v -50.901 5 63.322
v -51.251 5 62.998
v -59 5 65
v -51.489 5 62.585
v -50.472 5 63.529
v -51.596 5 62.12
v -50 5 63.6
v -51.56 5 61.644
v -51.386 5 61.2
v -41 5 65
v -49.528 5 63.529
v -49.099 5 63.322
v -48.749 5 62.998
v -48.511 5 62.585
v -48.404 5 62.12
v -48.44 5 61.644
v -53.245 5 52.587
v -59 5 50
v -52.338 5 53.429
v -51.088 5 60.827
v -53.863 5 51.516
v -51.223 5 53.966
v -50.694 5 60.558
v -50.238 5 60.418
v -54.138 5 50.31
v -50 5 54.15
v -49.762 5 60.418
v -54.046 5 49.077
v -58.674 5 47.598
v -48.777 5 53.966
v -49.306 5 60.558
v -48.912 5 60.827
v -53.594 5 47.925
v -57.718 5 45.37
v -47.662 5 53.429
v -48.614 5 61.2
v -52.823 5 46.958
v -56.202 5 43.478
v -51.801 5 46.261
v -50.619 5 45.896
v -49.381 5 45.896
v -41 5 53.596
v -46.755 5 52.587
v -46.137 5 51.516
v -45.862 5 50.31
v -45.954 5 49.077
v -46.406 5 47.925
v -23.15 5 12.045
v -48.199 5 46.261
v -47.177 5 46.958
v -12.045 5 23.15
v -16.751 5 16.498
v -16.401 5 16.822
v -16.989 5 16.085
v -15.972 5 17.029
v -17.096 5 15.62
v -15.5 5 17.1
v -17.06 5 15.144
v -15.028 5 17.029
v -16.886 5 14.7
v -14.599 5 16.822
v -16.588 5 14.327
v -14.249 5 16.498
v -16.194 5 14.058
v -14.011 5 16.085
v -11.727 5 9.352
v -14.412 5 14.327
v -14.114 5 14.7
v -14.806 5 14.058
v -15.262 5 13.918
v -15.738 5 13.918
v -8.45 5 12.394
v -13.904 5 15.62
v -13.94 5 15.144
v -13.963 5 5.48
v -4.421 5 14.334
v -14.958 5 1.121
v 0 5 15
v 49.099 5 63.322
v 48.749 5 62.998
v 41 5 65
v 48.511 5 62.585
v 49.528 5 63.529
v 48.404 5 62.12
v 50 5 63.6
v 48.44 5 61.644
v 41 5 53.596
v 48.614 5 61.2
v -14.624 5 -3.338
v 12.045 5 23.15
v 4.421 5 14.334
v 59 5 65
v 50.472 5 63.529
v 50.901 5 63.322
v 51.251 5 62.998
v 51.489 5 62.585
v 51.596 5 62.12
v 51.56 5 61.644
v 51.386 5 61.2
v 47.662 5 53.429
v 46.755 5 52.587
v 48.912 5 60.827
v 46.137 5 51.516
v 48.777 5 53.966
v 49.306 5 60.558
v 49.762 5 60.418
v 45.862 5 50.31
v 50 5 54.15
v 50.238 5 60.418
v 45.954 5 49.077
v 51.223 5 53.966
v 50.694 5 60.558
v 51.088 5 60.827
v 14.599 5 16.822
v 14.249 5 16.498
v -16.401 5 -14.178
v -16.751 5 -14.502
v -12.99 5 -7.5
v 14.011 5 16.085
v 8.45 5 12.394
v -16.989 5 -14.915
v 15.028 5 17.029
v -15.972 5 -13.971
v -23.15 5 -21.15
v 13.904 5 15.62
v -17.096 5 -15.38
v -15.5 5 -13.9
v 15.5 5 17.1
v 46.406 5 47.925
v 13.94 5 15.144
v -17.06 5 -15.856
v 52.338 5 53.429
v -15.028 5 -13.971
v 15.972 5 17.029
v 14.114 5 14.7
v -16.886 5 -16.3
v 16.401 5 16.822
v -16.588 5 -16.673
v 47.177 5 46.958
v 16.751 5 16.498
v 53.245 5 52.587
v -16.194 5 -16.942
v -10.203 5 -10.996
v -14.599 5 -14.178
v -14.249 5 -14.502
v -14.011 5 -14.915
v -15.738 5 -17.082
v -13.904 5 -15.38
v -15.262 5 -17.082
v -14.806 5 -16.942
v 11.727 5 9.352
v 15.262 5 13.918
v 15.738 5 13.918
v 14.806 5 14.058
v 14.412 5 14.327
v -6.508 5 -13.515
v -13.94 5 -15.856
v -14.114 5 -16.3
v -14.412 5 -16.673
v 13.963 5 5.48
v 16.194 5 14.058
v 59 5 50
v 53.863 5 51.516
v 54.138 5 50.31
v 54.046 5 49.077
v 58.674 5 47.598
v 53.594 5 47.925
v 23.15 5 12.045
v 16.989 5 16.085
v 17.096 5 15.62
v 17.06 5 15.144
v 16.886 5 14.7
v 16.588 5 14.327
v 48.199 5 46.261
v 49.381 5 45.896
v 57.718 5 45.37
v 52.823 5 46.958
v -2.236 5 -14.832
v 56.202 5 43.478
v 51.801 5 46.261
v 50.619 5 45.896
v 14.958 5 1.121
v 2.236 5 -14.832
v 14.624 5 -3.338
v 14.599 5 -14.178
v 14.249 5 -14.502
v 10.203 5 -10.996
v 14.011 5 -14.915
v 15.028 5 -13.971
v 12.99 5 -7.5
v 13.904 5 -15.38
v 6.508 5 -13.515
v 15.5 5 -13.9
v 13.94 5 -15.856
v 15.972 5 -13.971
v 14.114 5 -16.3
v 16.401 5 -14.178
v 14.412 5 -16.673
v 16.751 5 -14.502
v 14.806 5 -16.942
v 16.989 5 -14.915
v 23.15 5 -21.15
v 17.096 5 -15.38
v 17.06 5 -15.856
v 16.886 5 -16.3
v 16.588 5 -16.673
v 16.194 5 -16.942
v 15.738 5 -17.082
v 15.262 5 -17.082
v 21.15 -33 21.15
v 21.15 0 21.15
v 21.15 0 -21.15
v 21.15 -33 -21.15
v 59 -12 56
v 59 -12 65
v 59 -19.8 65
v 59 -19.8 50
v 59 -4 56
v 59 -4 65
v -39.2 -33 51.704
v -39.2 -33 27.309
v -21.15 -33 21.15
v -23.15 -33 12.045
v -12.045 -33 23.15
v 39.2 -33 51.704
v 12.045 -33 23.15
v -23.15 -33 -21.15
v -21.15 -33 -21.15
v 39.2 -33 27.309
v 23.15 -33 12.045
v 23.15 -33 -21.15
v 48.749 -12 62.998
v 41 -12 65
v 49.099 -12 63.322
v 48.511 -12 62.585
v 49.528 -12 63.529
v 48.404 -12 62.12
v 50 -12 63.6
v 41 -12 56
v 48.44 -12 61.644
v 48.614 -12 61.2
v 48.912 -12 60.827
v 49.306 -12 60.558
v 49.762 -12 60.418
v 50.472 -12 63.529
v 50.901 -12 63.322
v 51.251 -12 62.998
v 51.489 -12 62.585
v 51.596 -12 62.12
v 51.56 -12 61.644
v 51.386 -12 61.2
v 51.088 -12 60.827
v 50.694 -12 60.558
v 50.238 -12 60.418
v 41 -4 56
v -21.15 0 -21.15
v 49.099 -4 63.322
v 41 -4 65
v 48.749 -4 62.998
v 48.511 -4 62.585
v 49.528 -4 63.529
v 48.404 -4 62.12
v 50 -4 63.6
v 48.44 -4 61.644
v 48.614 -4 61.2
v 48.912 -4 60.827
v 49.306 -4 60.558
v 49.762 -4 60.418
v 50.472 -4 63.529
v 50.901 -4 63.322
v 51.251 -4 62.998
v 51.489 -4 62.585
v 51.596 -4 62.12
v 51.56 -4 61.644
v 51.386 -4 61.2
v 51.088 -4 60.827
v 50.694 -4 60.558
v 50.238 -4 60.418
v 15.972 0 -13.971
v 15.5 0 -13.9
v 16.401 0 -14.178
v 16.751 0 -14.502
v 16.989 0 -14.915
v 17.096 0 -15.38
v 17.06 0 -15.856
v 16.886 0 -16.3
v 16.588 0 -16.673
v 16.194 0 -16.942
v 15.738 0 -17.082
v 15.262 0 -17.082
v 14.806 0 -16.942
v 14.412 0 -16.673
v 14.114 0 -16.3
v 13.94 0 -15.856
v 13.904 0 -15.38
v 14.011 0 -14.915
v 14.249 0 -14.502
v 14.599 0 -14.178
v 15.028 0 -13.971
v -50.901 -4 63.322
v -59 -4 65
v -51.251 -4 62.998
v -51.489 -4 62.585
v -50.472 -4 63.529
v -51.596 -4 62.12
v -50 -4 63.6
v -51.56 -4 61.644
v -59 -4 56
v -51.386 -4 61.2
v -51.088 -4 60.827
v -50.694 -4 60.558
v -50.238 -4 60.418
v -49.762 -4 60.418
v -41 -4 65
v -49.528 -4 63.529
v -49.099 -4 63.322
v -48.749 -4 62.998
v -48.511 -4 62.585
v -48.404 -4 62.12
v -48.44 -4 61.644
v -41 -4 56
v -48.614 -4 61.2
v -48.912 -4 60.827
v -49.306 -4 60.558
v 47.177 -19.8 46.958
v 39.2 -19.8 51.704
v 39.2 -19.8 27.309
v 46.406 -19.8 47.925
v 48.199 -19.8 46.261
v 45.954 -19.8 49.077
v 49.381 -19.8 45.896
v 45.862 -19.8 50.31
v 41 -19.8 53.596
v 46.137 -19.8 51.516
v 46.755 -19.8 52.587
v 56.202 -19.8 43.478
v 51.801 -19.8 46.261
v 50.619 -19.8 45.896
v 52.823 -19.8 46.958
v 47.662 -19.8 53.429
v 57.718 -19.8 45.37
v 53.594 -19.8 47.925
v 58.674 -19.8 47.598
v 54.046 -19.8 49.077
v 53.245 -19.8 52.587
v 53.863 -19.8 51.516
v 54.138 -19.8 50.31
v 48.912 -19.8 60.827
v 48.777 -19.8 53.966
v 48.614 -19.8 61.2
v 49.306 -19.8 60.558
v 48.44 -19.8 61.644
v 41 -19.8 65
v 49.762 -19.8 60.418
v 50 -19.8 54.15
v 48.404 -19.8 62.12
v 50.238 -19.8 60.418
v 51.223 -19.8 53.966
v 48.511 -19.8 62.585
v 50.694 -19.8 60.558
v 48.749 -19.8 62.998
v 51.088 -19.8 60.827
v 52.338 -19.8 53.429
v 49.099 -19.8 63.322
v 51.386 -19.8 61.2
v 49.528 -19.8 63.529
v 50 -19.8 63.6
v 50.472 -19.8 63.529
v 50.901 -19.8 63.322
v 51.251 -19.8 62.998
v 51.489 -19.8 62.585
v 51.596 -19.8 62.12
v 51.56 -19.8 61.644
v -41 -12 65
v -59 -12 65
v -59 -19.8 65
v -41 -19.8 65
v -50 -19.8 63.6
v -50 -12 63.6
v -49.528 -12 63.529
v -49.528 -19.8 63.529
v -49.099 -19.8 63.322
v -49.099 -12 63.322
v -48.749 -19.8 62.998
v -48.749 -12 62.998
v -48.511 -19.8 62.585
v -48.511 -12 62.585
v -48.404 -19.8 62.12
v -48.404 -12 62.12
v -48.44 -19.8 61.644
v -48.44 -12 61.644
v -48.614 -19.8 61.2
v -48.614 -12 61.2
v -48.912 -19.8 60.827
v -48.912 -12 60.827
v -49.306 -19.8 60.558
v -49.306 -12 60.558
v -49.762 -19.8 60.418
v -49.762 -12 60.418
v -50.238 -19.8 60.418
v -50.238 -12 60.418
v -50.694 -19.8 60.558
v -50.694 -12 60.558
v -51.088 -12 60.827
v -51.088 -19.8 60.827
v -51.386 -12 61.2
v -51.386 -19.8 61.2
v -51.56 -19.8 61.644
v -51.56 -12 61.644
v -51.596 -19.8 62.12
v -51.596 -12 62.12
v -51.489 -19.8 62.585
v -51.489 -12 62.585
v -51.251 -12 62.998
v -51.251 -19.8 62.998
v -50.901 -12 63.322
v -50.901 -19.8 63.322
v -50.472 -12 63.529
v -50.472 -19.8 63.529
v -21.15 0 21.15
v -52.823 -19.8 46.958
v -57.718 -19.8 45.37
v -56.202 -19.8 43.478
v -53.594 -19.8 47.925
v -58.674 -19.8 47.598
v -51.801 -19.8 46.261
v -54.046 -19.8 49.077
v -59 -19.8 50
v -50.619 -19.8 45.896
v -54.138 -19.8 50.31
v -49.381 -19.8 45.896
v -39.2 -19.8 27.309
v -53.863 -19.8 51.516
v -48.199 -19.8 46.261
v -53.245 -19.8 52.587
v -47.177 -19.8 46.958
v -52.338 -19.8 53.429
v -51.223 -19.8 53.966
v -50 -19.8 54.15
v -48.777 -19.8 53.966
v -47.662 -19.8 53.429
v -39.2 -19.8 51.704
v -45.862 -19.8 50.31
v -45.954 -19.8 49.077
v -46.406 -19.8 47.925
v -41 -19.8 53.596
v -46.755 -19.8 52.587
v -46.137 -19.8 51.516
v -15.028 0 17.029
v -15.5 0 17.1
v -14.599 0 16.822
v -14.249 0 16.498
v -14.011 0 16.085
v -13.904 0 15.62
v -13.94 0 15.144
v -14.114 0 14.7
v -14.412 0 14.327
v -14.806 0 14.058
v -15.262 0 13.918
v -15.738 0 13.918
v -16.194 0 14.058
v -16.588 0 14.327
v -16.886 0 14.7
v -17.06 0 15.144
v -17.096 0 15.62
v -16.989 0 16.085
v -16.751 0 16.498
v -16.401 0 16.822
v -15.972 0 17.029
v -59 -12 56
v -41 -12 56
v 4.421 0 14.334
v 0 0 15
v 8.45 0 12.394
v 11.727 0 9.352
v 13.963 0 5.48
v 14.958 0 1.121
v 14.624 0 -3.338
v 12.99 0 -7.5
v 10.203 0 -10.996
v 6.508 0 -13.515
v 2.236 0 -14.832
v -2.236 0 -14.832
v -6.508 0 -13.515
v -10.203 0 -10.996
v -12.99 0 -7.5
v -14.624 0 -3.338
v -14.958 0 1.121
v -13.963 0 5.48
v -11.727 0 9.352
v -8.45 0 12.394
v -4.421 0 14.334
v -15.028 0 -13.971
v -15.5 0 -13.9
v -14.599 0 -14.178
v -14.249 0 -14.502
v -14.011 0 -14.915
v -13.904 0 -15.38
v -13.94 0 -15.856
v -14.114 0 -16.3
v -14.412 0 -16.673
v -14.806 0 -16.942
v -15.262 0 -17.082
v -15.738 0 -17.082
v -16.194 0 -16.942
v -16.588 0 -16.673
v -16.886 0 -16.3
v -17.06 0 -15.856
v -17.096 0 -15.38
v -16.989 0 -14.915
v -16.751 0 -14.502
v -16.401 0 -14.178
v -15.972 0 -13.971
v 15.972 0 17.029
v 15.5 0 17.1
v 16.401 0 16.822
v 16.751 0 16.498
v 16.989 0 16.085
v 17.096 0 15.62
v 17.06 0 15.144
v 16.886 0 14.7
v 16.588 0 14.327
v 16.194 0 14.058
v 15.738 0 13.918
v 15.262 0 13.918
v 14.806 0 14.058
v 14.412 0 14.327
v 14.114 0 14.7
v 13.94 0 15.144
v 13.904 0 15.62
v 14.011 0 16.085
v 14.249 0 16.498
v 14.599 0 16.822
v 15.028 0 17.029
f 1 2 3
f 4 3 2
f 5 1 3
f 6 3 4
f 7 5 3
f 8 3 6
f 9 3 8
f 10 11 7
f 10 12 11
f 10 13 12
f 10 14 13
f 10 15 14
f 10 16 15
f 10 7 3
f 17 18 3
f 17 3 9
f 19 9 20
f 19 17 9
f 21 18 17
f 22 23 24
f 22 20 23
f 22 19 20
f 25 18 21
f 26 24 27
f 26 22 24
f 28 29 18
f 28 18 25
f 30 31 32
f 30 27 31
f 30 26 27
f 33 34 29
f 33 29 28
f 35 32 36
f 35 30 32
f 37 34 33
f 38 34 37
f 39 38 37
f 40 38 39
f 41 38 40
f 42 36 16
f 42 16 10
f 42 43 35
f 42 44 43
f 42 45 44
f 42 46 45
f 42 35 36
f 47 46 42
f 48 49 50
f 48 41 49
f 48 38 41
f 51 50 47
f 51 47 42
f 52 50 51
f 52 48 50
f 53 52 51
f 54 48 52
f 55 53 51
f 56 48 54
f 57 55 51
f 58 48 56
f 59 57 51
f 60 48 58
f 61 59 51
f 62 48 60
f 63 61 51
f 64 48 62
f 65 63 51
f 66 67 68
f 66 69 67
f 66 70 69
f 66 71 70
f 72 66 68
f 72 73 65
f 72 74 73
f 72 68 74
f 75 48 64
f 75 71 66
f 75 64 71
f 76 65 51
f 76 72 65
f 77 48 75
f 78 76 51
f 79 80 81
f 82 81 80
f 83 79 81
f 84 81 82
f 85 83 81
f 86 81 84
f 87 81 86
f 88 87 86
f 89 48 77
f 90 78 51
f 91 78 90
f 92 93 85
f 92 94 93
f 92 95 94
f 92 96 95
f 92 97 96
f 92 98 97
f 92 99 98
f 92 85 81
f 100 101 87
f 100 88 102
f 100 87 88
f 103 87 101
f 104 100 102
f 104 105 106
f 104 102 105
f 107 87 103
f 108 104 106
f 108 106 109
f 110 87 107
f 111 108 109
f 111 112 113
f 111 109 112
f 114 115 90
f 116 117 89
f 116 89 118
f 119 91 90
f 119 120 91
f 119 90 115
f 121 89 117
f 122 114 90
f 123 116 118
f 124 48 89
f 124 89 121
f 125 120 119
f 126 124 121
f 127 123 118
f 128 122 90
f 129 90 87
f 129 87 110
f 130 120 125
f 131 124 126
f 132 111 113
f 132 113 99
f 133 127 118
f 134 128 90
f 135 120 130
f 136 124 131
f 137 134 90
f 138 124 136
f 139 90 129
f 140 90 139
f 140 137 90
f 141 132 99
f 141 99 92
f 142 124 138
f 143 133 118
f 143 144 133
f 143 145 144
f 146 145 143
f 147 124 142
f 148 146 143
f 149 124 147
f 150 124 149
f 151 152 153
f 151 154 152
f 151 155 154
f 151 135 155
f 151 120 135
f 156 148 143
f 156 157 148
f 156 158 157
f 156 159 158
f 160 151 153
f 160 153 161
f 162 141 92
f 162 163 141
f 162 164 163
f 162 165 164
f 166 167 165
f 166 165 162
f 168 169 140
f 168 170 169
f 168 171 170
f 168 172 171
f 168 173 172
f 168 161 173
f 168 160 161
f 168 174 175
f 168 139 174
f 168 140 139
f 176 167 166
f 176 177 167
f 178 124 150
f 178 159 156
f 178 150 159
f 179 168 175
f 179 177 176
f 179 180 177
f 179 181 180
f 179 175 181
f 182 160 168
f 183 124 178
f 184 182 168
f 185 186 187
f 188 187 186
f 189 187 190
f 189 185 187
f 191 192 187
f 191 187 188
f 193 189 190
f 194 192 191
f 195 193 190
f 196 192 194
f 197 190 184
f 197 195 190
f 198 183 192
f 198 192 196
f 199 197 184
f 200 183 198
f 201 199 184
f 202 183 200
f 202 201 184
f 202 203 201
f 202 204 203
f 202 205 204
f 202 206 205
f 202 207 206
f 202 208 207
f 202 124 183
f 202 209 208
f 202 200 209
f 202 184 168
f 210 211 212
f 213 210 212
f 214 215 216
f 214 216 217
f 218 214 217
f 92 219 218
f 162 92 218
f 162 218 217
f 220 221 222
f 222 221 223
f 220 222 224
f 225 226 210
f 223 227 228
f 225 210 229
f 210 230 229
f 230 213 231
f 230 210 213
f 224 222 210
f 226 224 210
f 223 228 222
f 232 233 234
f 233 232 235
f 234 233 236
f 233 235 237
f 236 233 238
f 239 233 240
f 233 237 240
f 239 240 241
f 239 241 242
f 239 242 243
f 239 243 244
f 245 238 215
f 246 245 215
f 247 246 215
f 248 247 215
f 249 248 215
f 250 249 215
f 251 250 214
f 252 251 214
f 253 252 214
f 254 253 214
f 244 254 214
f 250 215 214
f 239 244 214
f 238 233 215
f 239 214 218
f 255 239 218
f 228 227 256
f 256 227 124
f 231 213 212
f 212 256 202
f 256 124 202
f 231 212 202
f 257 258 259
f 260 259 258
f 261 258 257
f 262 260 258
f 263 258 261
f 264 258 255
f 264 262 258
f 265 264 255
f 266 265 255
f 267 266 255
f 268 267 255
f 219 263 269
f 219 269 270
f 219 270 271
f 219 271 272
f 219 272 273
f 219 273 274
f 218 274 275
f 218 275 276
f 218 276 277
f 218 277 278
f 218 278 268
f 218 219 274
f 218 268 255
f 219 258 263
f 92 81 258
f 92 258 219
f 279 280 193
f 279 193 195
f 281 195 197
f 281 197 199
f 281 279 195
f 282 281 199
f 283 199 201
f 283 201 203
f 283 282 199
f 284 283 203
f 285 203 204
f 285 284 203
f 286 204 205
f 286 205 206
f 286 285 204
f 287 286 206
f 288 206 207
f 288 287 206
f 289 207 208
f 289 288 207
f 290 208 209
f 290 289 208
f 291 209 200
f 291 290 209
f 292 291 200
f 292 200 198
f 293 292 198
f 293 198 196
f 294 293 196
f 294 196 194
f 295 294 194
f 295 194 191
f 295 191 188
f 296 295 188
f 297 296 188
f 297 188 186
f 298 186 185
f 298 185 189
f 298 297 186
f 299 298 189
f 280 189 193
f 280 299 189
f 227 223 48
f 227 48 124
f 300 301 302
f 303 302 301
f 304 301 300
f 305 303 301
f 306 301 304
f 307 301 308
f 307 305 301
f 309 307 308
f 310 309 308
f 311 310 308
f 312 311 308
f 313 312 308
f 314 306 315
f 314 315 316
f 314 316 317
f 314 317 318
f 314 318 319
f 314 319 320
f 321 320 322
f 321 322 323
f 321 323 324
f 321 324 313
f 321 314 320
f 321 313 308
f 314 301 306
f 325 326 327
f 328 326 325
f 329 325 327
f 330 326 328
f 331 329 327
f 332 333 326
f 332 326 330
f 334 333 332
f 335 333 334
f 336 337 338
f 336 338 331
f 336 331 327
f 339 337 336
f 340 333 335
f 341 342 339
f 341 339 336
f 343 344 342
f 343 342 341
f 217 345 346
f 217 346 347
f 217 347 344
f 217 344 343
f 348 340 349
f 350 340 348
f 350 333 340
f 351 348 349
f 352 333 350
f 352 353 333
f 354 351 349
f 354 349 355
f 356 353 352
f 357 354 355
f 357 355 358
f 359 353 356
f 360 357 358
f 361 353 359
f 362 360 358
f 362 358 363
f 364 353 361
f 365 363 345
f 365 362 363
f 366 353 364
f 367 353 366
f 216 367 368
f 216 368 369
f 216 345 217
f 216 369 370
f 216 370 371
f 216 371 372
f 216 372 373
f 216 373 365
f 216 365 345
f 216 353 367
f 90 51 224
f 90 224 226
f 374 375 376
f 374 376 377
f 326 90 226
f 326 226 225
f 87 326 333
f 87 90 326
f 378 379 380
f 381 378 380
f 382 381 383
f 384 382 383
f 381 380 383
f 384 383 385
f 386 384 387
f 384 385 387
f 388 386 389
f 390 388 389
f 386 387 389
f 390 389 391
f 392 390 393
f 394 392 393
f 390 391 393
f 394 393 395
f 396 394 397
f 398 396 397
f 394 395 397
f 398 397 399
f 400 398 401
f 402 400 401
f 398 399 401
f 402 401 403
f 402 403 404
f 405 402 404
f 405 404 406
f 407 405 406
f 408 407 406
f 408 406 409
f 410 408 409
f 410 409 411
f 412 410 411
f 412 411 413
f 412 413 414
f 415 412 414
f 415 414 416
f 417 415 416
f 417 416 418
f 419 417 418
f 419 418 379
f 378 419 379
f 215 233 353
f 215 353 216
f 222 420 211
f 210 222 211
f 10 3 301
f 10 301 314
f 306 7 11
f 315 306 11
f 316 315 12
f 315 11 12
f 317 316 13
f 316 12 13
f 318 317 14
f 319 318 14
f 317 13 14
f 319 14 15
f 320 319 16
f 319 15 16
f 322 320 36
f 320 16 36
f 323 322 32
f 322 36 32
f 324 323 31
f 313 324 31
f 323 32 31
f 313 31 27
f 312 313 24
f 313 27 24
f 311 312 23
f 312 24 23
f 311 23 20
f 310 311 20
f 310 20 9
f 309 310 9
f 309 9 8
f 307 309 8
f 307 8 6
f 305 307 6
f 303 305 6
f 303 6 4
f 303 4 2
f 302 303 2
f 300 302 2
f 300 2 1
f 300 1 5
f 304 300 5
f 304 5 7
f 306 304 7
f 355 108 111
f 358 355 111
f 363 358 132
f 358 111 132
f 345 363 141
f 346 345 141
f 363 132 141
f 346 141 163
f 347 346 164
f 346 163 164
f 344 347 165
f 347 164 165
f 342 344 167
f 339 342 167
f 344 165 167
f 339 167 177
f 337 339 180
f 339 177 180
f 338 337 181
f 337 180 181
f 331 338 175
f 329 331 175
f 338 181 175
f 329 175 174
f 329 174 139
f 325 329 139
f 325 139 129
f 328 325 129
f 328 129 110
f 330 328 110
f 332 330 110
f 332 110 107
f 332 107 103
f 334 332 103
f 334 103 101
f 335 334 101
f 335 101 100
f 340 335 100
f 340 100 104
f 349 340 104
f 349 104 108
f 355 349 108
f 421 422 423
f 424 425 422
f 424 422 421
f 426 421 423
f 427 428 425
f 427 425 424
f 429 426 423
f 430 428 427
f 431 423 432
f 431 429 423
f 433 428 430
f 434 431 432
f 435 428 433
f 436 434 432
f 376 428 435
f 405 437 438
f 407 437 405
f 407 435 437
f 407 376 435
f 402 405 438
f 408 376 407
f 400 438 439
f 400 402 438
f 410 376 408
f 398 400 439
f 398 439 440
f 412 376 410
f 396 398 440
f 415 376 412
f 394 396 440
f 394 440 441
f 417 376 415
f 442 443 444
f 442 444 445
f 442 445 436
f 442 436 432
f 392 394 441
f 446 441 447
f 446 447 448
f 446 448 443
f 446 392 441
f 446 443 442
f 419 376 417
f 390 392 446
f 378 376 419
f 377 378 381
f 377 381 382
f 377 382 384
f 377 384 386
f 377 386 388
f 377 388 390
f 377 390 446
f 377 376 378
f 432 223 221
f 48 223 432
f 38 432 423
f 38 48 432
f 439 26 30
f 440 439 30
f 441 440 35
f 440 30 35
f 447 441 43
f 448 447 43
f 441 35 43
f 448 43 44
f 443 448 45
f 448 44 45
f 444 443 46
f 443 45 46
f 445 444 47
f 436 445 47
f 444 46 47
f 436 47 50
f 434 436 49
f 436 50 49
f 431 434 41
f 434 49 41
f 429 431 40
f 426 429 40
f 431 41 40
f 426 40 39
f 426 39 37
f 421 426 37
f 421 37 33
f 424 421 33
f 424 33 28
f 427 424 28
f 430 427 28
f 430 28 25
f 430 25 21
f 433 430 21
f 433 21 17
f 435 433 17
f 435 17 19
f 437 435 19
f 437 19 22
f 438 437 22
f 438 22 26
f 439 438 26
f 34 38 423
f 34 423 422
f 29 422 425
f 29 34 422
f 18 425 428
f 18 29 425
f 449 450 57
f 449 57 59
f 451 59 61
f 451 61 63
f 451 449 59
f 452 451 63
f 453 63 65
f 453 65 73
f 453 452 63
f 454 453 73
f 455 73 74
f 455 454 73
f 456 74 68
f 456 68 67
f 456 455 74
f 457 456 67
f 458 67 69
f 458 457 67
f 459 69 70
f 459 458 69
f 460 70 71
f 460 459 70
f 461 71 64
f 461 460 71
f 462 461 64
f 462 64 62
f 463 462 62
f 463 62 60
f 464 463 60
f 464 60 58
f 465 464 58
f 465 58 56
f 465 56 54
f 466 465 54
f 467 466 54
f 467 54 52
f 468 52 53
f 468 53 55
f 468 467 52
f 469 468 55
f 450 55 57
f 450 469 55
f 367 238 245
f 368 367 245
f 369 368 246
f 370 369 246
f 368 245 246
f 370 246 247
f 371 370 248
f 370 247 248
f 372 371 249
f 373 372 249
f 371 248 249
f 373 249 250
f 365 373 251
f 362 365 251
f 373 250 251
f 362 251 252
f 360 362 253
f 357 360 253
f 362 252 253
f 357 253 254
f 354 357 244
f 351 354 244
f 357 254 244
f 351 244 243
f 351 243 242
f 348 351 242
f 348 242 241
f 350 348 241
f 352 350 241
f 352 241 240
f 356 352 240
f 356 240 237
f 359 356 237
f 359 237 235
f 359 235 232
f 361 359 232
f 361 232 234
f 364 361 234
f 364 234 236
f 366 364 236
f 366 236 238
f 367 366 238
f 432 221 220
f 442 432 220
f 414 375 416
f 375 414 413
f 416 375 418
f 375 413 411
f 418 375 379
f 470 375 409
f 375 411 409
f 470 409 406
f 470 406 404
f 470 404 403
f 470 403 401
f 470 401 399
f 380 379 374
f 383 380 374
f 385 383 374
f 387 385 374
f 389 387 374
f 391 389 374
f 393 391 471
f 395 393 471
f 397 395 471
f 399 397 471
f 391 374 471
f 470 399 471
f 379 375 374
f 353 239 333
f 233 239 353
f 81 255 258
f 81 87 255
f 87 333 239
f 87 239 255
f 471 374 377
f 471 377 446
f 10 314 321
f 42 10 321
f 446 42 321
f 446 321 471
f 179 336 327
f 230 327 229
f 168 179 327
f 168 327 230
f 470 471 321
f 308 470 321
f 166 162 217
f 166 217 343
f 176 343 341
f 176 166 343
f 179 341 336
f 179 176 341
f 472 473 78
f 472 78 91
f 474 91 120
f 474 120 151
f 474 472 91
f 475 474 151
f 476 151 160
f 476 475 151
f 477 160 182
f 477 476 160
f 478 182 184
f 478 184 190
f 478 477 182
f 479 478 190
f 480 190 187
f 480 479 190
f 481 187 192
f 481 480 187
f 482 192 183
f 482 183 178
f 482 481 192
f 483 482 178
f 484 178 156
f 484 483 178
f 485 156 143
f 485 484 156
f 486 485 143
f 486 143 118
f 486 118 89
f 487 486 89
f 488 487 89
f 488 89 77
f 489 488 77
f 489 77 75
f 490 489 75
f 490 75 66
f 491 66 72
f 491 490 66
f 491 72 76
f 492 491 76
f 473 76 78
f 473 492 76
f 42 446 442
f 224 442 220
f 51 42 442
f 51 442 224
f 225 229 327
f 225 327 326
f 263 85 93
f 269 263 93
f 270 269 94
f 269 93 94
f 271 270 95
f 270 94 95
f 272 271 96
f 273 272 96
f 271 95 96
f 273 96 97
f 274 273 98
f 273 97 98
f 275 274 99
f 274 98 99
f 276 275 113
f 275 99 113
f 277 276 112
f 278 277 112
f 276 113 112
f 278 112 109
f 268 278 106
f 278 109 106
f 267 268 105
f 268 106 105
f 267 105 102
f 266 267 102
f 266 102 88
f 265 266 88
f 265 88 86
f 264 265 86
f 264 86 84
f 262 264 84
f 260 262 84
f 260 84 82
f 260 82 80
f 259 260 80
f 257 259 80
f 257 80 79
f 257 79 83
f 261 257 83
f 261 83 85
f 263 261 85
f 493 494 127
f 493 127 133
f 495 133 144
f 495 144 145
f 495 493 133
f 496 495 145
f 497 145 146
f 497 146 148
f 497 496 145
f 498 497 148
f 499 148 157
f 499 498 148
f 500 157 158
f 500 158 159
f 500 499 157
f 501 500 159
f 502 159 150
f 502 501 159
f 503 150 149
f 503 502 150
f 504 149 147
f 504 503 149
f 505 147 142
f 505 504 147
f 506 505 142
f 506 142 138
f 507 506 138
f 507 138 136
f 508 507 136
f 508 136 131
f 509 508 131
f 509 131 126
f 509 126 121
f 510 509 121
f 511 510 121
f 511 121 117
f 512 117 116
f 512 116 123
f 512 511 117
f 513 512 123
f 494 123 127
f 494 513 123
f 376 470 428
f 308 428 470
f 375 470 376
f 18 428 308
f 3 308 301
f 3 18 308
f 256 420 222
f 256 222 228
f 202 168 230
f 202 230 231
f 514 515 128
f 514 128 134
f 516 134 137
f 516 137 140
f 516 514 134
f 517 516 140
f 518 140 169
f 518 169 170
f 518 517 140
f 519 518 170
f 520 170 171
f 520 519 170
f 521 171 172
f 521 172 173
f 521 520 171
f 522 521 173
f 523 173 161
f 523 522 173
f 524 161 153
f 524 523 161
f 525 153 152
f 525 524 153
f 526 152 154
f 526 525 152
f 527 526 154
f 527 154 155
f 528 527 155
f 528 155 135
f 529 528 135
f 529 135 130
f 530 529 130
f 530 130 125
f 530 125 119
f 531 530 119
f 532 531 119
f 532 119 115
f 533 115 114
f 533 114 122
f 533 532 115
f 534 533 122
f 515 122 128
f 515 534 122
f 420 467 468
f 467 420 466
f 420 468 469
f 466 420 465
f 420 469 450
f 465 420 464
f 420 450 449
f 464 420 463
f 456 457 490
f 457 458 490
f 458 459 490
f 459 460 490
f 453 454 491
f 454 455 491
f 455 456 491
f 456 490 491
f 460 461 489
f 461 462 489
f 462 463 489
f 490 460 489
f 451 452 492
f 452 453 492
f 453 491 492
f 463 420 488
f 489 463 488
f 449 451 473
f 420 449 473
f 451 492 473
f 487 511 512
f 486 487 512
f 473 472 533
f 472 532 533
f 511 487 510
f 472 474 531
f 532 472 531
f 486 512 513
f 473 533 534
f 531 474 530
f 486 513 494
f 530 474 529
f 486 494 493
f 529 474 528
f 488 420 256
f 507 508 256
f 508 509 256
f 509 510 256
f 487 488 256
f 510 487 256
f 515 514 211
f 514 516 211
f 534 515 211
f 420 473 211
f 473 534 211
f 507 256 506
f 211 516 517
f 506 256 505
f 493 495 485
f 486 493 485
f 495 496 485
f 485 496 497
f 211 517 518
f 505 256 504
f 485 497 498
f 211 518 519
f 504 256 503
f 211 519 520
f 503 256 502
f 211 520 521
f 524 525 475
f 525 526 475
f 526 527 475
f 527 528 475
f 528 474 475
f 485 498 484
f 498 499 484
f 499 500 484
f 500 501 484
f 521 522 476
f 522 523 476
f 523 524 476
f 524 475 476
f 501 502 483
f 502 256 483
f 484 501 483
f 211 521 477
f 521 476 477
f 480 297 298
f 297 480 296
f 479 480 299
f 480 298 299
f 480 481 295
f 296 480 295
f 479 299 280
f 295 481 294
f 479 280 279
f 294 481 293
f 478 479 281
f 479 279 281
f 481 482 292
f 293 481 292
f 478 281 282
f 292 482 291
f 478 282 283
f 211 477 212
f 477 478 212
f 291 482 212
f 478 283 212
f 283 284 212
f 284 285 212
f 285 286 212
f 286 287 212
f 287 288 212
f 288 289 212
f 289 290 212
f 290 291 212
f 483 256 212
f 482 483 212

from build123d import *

# Parameters (mm, degrees)
SKETCH_6_W          = 42.3
SKETCH_6_H          = 42.3
SKETCH_6_R          = 1.6
SKETCH_6_R_2        = 15
EXTRUDE_1_DEPTH     = 5
SKETCH_7_R          = 1.6
SKETCH_7_R_2        = 4.15
EXTRUDE_5_DEPTH     = 38
SKETCH_7_7_R        = 4.15
SKETCH_7_7_R_2      = 1.6
EXTRUDE_7_DEPTH     = 38
SKETCH_7_8_R        = 4.15
SKETCH_7_8_R_2      = 1.6
EXTRUDE_8_DEPTH     = 38
SKETCH_12_W         = 2
SKETCH_12_H         = 44.3
EXTRUDE_11_DEPTH    = 38
SKETCH_14_W         = 44.3
SKETCH_14_H         = 2
EXTRUDE_12_DEPTH    = 38
SKETCH_15_W         = 2
SKETCH_15_H         = 42.3
EXTRUDE_13_DEPTH    = 38
SKETCH_17_W         = 20.286999771
SKETCH_17_H         = 45
SKETCH_17_W_2       = 22.63718559
SKETCH_17_H_2       = 42.177300538
CUT_EXTRUDE_1_DEPTH = 13.2
SKETCH_18_W         = 9
SKETCH_18_H         = 8
CUT_EXTRUDE_2_DEPTH = 123


with BuildPart() as part:
    # 草图6 → 凸台-拉伸1 (new body)
    with BuildSketch(Plane(origin=(0, 0, 0), x_dir=(1, 0, 0), z_dir=(0, 1, 0))):
        Rectangle(SKETCH_6_W, SKETCH_6_H)
        with Locations(Location((15.5, 15.5, 0), (0, 0, 270))):
            Circle(SKETCH_6_R, mode=Mode.SUBTRACT)
        with Locations(Location((-15.5, 15.5, 0), (0, 0, 270))):
            Circle(SKETCH_6_R, mode=Mode.SUBTRACT)
        with Locations(Location((-15.5, -15.5, 0), (0, 0, 270))):
            Circle(SKETCH_6_R, mode=Mode.SUBTRACT)
        with Locations(Location((15.5, -15.5, 0), (0, 0, 270))):
            Circle(SKETCH_6_R, mode=Mode.SUBTRACT)
        with Locations(Location((0, 0, 0), (0, 0, 270))):
            Circle(SKETCH_6_R_2, mode=Mode.SUBTRACT)
    extrude(amount=EXTRUDE_1_DEPTH)

    # 草图7 → 凸台-拉伸5 (add)
    with BuildSketch(Plane(origin=(0, 5, 0), x_dir=(1, 0, 0), z_dir=(0, 1, 0))):
        with BuildLine():
            Line((56.202269248, -43.478354795), (21.15, -10.142654247))
            Line((21.15, -10.142654247), (21.15, -21.15))
            Line((21.15, -21.15), (10.142654247, -21.15))
            Line((10.142654247, -21.15), (41, -53.596295528))
            Line((41, -53.596295528), (41, -65))
            Line((41, -65), (59, -65))
            Line((59, -65), (59, -50))
            ThreePointArc((59, -50), (58.271046585, -46.45179082), (56.202269248, -43.478354795))
        make_face()
        with Locations(Location((50, -62, 0), (0, 0, 270))):
            Circle(SKETCH_7_R, mode=Mode.SUBTRACT)
        with Locations(Location((50, -50, 0), (0, 0, 270))):
            Circle(SKETCH_7_R_2, mode=Mode.SUBTRACT)
        with BuildLine():
            Line((-41, -53.596295528), (-10.142654247, -21.15))
            Line((-10.142654247, -21.15), (-21.15, -21.15))
            Line((-21.15, -21.15), (-21.15, -10.142654247))
            Line((-21.15, -10.142654247), (-56.202269248, -43.478354795))
            ThreePointArc((-56.202269248, -43.478354795), (-58.271046585, -46.45179082), (-59, -50))
            Line((-59, -50), (-59, -65))
            Line((-59, -65), (-41, -65))
            Line((-41, -65), (-41, -53.596295528))
        make_face()
        with Locations(Location((-50, -62, 0), (0, 0, 270))):
            Circle(SKETCH_7_R, mode=Mode.SUBTRACT)
        with Locations(Location((-50, -50, 0), (0, 0, 270))):
            Circle(SKETCH_7_R_2, mode=Mode.SUBTRACT)
    extrude(amount=-EXTRUDE_5_DEPTH)


with BuildPart() as extrude_7_tool:
    # 草图7<7> → 凸台-拉伸7 (new body)
    with BuildSketch(Plane(origin=(0, 5, 0), x_dir=(1, 0, 0), z_dir=(0, 1, 0))):
        with Locations(Location((-50, -50, 0), (0, 0, 270))):
            Circle(SKETCH_7_7_R)
        with Locations(Location((50, -50, 0), (0, 0, 270))):
            Circle(SKETCH_7_7_R)
        with Locations(Location((50, -62, 0), (0, 0, 270))):
            Circle(SKETCH_7_7_R_2)
        with Locations(Location((-50, -62, 0), (0, 0, 270))):
            Circle(SKETCH_7_7_R_2)
    extrude(amount=EXTRUDE_7_DEPTH)


with BuildPart() as part_1:
    add(part.part)


with BuildPart() as part_2:
    # 凸台-拉伸7: joined with extrude_7_tool
    add(part_1.part.fuse(extrude_7_tool.part, tol=0.00001))


with BuildPart() as extrude_7_kept_piece:
    # of the separate pieces the step leaves, the one the design keeps (extrude_7_pieces_kept)
    add(part_2.part.solids().sort_by_distance((-10.142654247, 0, 21.15))[0])


with BuildPart() as extrude_8_tool:
    # 草图7<8> → 凸台-拉伸8 (new body)
    with BuildSketch(Plane(origin=(0, 5, 0), x_dir=(1, 0, 0), z_dir=(0, 1, 0))):
        with Locations(Location((-50, -50, 0), (0, 0, 270))):
            Circle(SKETCH_7_8_R)
        with Locations(Location((50, -50, 0), (0, 0, 270))):
            Circle(SKETCH_7_8_R)
        with Locations(Location((50, -62, 0), (0, 0, 270))):
            Circle(SKETCH_7_8_R_2)
        with Locations(Location((-50, -62, 0), (0, 0, 270))):
            Circle(SKETCH_7_8_R_2)
    extrude(amount=EXTRUDE_8_DEPTH)


with BuildPart() as extrude_7_kept_piece_1:
    add(extrude_7_kept_piece.part)


with BuildPart() as extrude_7_kept_piece_2:
    # 凸台-拉伸8: joined with extrude_8_tool
    add(extrude_7_kept_piece_1.part.fuse(extrude_8_tool.part, tol=0.00001))


with BuildPart() as extrude_8_kept_piece:
    # of the separate pieces the step leaves, the one the design keeps (extrude_8_pieces_kept)
    add(extrude_7_kept_piece_2.part.solids().sort_by_distance((-10.142654247, 0, 21.15))[0])

    # 草图12 → 凸台-拉伸11 (add)
    with BuildSketch(Plane(origin=(0, 5, 0), x_dir=(1, 0, 0), z_dir=(0, 1, 0))):
        with Locations((22.15, -1)):
            Rectangle(SKETCH_12_W, SKETCH_12_H)
    extrude(amount=-EXTRUDE_11_DEPTH)

    # 草图14 → 凸台-拉伸12 (add)
    with BuildSketch(Plane(origin=(0, 5, 0), x_dir=(1, 0, 0), z_dir=(0, 1, 0))):
        with Locations((-1, -22.15)):
            Rectangle(SKETCH_14_W, SKETCH_14_H)
    extrude(amount=-EXTRUDE_12_DEPTH)

    # 草图15 → 凸台-拉伸13 (add)
    with BuildSketch(Plane(origin=(0, 5, 0), x_dir=(1, 0, 0), z_dir=(0, 1, 0))):
        with Locations((-22.15, 0)):
            Rectangle(SKETCH_15_W, SKETCH_15_H)
    extrude(amount=-EXTRUDE_13_DEPTH)

    # 草图17 → 切除-拉伸1 (cut)
    with BuildSketch(Plane.XZ.offset(33)):
        with Locations((49.343499886, 42.5)):
            Rectangle(SKETCH_17_W, SKETCH_17_H)
        with Locations((-50.518592795, 44.367414657)):
            Rectangle(SKETCH_17_W_2, SKETCH_17_H_2)
    extrude(amount=-CUT_EXTRUDE_1_DEPTH, mode=Mode.SUBTRACT)

    # 草图18 → 切除-拉伸2 (cut)
    with BuildSketch(Plane(origin=(59, 0, 0), x_dir=(0, 0, -1), z_dir=(1, 0, 0))):
        with Locations((-60.5, -8)):
            Rectangle(SKETCH_18_W, SKETCH_18_H)
    extrude(amount=-CUT_EXTRUDE_2_DEPTH, mode=Mode.SUBTRACT)


solid = extrude_8_kept_piece.part
